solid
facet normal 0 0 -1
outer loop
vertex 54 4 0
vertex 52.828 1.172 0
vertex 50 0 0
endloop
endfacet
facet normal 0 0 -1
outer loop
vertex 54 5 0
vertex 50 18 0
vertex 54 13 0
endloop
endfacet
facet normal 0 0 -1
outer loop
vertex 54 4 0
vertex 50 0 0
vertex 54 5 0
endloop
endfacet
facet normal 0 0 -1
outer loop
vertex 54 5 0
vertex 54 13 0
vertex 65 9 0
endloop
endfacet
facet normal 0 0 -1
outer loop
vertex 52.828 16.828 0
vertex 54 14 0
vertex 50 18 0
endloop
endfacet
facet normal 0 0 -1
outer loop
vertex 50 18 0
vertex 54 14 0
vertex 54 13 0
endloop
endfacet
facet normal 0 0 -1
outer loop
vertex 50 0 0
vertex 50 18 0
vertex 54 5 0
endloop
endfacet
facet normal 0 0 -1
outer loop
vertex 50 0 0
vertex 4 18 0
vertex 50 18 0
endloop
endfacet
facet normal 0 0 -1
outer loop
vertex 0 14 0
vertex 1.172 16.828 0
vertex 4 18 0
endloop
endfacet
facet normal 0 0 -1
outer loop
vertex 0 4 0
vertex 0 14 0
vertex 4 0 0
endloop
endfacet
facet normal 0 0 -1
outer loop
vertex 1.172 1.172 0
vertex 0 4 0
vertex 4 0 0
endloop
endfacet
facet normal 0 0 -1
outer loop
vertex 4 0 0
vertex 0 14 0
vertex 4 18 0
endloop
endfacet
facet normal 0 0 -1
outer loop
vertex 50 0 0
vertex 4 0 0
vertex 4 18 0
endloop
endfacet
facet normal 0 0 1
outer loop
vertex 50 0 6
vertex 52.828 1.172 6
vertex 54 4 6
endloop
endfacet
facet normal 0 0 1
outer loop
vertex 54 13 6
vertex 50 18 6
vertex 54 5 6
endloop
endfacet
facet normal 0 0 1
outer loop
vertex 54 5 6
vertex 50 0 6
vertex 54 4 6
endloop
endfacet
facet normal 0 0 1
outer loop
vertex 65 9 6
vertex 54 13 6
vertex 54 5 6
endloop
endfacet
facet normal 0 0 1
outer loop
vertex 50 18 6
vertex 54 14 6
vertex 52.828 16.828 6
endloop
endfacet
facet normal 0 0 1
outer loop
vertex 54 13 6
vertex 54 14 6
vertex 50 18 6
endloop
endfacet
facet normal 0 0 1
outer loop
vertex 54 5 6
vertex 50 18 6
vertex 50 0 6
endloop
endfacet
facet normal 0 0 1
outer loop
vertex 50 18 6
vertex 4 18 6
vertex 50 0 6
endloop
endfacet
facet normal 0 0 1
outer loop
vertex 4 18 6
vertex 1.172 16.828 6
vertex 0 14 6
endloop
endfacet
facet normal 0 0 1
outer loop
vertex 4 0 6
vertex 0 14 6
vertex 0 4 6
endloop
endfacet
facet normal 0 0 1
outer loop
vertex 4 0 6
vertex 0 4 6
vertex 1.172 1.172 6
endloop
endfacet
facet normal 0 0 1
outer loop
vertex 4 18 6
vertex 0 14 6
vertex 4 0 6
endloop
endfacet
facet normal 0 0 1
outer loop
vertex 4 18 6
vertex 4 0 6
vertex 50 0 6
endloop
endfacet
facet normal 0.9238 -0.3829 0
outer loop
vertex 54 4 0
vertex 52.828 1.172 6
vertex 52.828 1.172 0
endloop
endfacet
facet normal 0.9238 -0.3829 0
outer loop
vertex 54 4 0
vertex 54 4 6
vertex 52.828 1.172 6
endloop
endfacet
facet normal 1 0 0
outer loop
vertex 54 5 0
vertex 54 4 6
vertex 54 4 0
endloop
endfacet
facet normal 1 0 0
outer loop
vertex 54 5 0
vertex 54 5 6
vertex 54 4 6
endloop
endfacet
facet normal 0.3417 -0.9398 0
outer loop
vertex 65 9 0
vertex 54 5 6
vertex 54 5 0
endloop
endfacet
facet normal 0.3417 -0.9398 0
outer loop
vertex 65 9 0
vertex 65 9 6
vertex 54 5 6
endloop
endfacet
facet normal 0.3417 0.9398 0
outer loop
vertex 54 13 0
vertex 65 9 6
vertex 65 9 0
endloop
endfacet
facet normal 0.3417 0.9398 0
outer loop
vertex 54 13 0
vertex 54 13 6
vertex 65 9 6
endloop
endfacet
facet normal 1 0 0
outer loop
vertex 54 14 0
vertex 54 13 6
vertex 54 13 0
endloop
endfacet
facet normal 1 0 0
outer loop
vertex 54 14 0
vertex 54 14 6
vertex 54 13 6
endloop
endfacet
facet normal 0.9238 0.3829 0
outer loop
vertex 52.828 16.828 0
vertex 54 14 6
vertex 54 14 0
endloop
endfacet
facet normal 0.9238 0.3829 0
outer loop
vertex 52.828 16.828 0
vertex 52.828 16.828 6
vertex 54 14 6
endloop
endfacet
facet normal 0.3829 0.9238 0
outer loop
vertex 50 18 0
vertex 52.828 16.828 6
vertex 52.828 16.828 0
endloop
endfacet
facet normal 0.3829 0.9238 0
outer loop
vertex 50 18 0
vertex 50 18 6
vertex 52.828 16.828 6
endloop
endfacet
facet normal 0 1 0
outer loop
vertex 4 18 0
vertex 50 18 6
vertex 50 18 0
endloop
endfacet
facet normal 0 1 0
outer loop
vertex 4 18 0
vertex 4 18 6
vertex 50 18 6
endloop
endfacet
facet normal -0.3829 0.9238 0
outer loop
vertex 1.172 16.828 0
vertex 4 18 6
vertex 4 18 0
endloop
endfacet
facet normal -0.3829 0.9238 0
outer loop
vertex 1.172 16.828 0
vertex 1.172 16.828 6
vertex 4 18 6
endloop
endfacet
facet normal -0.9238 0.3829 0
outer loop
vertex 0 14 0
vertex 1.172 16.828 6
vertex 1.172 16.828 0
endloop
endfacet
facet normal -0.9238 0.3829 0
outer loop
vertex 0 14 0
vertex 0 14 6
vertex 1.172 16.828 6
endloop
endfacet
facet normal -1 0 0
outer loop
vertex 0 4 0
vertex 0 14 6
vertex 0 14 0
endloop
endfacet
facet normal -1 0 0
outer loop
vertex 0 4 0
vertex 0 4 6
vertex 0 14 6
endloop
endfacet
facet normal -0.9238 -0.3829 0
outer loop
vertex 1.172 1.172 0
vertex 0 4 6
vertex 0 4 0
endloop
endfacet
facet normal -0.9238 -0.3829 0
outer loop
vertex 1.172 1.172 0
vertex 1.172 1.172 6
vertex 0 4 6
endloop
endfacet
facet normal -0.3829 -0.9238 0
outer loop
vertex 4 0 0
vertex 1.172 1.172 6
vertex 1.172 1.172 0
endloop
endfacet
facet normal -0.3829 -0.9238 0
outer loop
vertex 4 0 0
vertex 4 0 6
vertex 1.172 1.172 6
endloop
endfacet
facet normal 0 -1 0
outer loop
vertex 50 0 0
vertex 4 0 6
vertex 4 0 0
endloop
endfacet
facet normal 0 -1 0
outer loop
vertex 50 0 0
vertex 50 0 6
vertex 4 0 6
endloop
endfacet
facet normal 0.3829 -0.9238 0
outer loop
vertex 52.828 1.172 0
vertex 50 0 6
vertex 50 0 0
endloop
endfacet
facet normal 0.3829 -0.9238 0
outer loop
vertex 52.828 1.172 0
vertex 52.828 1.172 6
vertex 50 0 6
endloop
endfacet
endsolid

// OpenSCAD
$fn = 32;

// ----------------------------------------------------------------------
// Ratchet pawl: 54 x 18 mm body, beak 11 mm с правого торца
// ----------------------------------------------------------------------

// --- parameters (mm) ---
profile_height = 6;       // extrusion height
profile_points = 15;      // points of the closed outline

profile = [[0, 4], [1.172, 1.172], [4, 0], [50, 0], [52.828, 1.172], [54, 4], [54, 5], [65, 9], [54, 13], [54, 14], [52.828, 16.828], [50, 18], [4, 18], [1.172, 16.828], [0, 14]];  // single closed polygon, 15 points, counter clockwise

// --- the one profile operation ---
linear_extrude(height = profile_height) polygon(points = profile);
